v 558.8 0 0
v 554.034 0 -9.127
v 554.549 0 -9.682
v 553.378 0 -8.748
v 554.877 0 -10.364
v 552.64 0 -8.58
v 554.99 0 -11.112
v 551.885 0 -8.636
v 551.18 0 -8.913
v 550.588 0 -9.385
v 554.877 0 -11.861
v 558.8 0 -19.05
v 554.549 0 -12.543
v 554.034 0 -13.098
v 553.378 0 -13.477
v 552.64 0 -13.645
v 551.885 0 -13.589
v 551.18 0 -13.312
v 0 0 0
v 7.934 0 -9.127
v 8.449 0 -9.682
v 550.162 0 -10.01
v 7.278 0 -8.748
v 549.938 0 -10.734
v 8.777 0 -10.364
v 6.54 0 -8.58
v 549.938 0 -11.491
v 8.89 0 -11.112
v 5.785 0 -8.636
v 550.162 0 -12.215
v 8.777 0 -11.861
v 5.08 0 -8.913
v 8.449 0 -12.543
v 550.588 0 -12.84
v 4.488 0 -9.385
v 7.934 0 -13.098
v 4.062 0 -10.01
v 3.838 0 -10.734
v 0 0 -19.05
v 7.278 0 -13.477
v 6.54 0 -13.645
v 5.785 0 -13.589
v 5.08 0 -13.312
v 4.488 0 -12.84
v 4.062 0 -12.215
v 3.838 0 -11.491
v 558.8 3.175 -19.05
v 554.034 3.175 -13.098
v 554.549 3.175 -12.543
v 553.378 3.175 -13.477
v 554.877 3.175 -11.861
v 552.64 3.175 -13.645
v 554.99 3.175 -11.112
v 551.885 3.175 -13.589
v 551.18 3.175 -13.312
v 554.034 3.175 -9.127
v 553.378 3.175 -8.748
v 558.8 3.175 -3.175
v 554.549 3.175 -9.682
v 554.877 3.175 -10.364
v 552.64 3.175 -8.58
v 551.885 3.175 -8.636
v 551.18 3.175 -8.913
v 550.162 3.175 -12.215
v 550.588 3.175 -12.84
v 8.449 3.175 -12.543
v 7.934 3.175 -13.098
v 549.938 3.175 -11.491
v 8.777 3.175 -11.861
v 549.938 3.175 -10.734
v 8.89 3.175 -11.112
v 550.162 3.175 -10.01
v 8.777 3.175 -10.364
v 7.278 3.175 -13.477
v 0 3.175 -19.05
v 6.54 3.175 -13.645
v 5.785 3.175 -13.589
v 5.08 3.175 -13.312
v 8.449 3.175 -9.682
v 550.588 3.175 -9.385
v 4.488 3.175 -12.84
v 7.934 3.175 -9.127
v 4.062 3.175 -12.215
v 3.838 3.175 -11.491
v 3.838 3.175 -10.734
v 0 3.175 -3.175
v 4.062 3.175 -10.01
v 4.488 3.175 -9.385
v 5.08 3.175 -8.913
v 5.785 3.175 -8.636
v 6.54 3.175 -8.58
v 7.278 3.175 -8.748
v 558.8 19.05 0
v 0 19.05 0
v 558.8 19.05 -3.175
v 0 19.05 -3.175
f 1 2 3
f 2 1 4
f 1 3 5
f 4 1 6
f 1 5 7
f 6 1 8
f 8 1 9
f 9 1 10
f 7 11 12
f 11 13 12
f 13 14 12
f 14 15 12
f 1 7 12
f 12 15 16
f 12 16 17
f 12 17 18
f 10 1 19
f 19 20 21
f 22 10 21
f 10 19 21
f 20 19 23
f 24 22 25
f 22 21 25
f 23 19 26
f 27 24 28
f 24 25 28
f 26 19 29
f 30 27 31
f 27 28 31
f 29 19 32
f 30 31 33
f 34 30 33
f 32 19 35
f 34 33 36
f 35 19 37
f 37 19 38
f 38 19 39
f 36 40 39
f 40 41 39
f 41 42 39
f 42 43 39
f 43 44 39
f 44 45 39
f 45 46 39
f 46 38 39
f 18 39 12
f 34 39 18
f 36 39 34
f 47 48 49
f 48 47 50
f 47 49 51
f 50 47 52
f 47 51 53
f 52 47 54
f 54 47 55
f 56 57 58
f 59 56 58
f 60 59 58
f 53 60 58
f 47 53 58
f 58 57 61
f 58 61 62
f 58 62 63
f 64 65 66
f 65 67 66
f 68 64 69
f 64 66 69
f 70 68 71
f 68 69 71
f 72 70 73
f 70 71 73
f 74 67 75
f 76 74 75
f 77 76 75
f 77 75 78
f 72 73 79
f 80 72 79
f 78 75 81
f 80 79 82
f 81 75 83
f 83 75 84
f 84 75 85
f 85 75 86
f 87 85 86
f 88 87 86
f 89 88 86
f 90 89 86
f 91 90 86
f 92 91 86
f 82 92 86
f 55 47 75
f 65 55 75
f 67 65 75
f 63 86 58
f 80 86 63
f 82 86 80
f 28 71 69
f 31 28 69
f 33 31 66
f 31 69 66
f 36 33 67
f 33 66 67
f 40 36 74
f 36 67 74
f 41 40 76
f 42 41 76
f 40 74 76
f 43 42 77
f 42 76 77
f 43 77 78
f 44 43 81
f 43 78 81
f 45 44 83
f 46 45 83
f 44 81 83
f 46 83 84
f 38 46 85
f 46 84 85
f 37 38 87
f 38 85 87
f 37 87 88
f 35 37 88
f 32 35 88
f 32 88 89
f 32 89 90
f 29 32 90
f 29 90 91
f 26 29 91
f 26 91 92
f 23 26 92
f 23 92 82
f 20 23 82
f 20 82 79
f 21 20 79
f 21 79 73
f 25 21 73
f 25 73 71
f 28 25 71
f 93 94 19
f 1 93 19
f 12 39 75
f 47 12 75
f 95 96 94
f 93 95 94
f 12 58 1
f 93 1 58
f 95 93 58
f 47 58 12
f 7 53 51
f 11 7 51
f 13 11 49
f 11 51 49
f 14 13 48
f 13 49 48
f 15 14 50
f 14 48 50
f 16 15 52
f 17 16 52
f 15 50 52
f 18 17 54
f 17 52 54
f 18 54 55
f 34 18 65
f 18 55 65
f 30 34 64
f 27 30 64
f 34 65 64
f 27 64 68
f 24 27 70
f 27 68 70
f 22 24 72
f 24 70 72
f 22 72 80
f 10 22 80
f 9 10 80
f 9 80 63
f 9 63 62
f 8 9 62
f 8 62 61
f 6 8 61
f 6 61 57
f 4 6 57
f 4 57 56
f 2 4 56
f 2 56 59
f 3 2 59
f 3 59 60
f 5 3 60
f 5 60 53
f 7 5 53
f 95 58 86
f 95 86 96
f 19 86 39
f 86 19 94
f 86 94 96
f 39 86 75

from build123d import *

# Parameters (mm, degrees)
BOSS_EXTRUDE1_DEPTH = 558.8
CUT_EXTRUDE1_REACH  = 5.175
SKETCH2_R           = 2.54


with BuildPart() as part:
    # Sketch1 → Boss-Extrude1 (new body)
    with BuildSketch(Plane(origin=(0, 0, 0), x_dir=(0, 0, -1), z_dir=(1, 0, 0))):
        Polygon((3.175, 3.175), (3.175, 19.05), (0, 19.05), (0, 0), (19.05, 0), (19.05, 3.175), align=None)
    extrude(amount=BOSS_EXTRUDE1_DEPTH)

    # Sketch2 → Cut-Extrude1 (cut, up to next)
    with BuildSketch(Plane(origin=(0, 3.175, 0), x_dir=(1, 0, 0), z_dir=(0, 1, 0)), mode=Mode.PRIVATE) as cut_extrude1_sk1:
        with Locations((552.45, 11.1125)):
            Circle(SKETCH2_R)
    cut_extrude1_tool1 = extrude(cut_extrude1_sk1.sketch, amount=-CUT_EXTRUDE1_REACH, mode=Mode.PRIVATE) & part.part
    add(cut_extrude1_tool1.solids().sort_by_distance((552.45, 3.175, -11.1125))[0], mode=Mode.SUBTRACT)
    # Sketch2 → Cut-Extrude1 (cut, up to next)
    with BuildSketch(Plane(origin=(0, 3.175, 0), x_dir=(1, 0, 0), z_dir=(0, 1, 0)), mode=Mode.PRIVATE) as cut_extrude1_sk2:
        with Locations((6.35, 11.1125)):
            Circle(SKETCH2_R)
    cut_extrude1_tool2 = extrude(cut_extrude1_sk2.sketch, amount=-CUT_EXTRUDE1_REACH, mode=Mode.PRIVATE) & part.part
    add(cut_extrude1_tool2.solids().sort_by_distance((6.35, 3.175, -11.1125))[0], mode=Mode.SUBTRACT)


solid = part.part
